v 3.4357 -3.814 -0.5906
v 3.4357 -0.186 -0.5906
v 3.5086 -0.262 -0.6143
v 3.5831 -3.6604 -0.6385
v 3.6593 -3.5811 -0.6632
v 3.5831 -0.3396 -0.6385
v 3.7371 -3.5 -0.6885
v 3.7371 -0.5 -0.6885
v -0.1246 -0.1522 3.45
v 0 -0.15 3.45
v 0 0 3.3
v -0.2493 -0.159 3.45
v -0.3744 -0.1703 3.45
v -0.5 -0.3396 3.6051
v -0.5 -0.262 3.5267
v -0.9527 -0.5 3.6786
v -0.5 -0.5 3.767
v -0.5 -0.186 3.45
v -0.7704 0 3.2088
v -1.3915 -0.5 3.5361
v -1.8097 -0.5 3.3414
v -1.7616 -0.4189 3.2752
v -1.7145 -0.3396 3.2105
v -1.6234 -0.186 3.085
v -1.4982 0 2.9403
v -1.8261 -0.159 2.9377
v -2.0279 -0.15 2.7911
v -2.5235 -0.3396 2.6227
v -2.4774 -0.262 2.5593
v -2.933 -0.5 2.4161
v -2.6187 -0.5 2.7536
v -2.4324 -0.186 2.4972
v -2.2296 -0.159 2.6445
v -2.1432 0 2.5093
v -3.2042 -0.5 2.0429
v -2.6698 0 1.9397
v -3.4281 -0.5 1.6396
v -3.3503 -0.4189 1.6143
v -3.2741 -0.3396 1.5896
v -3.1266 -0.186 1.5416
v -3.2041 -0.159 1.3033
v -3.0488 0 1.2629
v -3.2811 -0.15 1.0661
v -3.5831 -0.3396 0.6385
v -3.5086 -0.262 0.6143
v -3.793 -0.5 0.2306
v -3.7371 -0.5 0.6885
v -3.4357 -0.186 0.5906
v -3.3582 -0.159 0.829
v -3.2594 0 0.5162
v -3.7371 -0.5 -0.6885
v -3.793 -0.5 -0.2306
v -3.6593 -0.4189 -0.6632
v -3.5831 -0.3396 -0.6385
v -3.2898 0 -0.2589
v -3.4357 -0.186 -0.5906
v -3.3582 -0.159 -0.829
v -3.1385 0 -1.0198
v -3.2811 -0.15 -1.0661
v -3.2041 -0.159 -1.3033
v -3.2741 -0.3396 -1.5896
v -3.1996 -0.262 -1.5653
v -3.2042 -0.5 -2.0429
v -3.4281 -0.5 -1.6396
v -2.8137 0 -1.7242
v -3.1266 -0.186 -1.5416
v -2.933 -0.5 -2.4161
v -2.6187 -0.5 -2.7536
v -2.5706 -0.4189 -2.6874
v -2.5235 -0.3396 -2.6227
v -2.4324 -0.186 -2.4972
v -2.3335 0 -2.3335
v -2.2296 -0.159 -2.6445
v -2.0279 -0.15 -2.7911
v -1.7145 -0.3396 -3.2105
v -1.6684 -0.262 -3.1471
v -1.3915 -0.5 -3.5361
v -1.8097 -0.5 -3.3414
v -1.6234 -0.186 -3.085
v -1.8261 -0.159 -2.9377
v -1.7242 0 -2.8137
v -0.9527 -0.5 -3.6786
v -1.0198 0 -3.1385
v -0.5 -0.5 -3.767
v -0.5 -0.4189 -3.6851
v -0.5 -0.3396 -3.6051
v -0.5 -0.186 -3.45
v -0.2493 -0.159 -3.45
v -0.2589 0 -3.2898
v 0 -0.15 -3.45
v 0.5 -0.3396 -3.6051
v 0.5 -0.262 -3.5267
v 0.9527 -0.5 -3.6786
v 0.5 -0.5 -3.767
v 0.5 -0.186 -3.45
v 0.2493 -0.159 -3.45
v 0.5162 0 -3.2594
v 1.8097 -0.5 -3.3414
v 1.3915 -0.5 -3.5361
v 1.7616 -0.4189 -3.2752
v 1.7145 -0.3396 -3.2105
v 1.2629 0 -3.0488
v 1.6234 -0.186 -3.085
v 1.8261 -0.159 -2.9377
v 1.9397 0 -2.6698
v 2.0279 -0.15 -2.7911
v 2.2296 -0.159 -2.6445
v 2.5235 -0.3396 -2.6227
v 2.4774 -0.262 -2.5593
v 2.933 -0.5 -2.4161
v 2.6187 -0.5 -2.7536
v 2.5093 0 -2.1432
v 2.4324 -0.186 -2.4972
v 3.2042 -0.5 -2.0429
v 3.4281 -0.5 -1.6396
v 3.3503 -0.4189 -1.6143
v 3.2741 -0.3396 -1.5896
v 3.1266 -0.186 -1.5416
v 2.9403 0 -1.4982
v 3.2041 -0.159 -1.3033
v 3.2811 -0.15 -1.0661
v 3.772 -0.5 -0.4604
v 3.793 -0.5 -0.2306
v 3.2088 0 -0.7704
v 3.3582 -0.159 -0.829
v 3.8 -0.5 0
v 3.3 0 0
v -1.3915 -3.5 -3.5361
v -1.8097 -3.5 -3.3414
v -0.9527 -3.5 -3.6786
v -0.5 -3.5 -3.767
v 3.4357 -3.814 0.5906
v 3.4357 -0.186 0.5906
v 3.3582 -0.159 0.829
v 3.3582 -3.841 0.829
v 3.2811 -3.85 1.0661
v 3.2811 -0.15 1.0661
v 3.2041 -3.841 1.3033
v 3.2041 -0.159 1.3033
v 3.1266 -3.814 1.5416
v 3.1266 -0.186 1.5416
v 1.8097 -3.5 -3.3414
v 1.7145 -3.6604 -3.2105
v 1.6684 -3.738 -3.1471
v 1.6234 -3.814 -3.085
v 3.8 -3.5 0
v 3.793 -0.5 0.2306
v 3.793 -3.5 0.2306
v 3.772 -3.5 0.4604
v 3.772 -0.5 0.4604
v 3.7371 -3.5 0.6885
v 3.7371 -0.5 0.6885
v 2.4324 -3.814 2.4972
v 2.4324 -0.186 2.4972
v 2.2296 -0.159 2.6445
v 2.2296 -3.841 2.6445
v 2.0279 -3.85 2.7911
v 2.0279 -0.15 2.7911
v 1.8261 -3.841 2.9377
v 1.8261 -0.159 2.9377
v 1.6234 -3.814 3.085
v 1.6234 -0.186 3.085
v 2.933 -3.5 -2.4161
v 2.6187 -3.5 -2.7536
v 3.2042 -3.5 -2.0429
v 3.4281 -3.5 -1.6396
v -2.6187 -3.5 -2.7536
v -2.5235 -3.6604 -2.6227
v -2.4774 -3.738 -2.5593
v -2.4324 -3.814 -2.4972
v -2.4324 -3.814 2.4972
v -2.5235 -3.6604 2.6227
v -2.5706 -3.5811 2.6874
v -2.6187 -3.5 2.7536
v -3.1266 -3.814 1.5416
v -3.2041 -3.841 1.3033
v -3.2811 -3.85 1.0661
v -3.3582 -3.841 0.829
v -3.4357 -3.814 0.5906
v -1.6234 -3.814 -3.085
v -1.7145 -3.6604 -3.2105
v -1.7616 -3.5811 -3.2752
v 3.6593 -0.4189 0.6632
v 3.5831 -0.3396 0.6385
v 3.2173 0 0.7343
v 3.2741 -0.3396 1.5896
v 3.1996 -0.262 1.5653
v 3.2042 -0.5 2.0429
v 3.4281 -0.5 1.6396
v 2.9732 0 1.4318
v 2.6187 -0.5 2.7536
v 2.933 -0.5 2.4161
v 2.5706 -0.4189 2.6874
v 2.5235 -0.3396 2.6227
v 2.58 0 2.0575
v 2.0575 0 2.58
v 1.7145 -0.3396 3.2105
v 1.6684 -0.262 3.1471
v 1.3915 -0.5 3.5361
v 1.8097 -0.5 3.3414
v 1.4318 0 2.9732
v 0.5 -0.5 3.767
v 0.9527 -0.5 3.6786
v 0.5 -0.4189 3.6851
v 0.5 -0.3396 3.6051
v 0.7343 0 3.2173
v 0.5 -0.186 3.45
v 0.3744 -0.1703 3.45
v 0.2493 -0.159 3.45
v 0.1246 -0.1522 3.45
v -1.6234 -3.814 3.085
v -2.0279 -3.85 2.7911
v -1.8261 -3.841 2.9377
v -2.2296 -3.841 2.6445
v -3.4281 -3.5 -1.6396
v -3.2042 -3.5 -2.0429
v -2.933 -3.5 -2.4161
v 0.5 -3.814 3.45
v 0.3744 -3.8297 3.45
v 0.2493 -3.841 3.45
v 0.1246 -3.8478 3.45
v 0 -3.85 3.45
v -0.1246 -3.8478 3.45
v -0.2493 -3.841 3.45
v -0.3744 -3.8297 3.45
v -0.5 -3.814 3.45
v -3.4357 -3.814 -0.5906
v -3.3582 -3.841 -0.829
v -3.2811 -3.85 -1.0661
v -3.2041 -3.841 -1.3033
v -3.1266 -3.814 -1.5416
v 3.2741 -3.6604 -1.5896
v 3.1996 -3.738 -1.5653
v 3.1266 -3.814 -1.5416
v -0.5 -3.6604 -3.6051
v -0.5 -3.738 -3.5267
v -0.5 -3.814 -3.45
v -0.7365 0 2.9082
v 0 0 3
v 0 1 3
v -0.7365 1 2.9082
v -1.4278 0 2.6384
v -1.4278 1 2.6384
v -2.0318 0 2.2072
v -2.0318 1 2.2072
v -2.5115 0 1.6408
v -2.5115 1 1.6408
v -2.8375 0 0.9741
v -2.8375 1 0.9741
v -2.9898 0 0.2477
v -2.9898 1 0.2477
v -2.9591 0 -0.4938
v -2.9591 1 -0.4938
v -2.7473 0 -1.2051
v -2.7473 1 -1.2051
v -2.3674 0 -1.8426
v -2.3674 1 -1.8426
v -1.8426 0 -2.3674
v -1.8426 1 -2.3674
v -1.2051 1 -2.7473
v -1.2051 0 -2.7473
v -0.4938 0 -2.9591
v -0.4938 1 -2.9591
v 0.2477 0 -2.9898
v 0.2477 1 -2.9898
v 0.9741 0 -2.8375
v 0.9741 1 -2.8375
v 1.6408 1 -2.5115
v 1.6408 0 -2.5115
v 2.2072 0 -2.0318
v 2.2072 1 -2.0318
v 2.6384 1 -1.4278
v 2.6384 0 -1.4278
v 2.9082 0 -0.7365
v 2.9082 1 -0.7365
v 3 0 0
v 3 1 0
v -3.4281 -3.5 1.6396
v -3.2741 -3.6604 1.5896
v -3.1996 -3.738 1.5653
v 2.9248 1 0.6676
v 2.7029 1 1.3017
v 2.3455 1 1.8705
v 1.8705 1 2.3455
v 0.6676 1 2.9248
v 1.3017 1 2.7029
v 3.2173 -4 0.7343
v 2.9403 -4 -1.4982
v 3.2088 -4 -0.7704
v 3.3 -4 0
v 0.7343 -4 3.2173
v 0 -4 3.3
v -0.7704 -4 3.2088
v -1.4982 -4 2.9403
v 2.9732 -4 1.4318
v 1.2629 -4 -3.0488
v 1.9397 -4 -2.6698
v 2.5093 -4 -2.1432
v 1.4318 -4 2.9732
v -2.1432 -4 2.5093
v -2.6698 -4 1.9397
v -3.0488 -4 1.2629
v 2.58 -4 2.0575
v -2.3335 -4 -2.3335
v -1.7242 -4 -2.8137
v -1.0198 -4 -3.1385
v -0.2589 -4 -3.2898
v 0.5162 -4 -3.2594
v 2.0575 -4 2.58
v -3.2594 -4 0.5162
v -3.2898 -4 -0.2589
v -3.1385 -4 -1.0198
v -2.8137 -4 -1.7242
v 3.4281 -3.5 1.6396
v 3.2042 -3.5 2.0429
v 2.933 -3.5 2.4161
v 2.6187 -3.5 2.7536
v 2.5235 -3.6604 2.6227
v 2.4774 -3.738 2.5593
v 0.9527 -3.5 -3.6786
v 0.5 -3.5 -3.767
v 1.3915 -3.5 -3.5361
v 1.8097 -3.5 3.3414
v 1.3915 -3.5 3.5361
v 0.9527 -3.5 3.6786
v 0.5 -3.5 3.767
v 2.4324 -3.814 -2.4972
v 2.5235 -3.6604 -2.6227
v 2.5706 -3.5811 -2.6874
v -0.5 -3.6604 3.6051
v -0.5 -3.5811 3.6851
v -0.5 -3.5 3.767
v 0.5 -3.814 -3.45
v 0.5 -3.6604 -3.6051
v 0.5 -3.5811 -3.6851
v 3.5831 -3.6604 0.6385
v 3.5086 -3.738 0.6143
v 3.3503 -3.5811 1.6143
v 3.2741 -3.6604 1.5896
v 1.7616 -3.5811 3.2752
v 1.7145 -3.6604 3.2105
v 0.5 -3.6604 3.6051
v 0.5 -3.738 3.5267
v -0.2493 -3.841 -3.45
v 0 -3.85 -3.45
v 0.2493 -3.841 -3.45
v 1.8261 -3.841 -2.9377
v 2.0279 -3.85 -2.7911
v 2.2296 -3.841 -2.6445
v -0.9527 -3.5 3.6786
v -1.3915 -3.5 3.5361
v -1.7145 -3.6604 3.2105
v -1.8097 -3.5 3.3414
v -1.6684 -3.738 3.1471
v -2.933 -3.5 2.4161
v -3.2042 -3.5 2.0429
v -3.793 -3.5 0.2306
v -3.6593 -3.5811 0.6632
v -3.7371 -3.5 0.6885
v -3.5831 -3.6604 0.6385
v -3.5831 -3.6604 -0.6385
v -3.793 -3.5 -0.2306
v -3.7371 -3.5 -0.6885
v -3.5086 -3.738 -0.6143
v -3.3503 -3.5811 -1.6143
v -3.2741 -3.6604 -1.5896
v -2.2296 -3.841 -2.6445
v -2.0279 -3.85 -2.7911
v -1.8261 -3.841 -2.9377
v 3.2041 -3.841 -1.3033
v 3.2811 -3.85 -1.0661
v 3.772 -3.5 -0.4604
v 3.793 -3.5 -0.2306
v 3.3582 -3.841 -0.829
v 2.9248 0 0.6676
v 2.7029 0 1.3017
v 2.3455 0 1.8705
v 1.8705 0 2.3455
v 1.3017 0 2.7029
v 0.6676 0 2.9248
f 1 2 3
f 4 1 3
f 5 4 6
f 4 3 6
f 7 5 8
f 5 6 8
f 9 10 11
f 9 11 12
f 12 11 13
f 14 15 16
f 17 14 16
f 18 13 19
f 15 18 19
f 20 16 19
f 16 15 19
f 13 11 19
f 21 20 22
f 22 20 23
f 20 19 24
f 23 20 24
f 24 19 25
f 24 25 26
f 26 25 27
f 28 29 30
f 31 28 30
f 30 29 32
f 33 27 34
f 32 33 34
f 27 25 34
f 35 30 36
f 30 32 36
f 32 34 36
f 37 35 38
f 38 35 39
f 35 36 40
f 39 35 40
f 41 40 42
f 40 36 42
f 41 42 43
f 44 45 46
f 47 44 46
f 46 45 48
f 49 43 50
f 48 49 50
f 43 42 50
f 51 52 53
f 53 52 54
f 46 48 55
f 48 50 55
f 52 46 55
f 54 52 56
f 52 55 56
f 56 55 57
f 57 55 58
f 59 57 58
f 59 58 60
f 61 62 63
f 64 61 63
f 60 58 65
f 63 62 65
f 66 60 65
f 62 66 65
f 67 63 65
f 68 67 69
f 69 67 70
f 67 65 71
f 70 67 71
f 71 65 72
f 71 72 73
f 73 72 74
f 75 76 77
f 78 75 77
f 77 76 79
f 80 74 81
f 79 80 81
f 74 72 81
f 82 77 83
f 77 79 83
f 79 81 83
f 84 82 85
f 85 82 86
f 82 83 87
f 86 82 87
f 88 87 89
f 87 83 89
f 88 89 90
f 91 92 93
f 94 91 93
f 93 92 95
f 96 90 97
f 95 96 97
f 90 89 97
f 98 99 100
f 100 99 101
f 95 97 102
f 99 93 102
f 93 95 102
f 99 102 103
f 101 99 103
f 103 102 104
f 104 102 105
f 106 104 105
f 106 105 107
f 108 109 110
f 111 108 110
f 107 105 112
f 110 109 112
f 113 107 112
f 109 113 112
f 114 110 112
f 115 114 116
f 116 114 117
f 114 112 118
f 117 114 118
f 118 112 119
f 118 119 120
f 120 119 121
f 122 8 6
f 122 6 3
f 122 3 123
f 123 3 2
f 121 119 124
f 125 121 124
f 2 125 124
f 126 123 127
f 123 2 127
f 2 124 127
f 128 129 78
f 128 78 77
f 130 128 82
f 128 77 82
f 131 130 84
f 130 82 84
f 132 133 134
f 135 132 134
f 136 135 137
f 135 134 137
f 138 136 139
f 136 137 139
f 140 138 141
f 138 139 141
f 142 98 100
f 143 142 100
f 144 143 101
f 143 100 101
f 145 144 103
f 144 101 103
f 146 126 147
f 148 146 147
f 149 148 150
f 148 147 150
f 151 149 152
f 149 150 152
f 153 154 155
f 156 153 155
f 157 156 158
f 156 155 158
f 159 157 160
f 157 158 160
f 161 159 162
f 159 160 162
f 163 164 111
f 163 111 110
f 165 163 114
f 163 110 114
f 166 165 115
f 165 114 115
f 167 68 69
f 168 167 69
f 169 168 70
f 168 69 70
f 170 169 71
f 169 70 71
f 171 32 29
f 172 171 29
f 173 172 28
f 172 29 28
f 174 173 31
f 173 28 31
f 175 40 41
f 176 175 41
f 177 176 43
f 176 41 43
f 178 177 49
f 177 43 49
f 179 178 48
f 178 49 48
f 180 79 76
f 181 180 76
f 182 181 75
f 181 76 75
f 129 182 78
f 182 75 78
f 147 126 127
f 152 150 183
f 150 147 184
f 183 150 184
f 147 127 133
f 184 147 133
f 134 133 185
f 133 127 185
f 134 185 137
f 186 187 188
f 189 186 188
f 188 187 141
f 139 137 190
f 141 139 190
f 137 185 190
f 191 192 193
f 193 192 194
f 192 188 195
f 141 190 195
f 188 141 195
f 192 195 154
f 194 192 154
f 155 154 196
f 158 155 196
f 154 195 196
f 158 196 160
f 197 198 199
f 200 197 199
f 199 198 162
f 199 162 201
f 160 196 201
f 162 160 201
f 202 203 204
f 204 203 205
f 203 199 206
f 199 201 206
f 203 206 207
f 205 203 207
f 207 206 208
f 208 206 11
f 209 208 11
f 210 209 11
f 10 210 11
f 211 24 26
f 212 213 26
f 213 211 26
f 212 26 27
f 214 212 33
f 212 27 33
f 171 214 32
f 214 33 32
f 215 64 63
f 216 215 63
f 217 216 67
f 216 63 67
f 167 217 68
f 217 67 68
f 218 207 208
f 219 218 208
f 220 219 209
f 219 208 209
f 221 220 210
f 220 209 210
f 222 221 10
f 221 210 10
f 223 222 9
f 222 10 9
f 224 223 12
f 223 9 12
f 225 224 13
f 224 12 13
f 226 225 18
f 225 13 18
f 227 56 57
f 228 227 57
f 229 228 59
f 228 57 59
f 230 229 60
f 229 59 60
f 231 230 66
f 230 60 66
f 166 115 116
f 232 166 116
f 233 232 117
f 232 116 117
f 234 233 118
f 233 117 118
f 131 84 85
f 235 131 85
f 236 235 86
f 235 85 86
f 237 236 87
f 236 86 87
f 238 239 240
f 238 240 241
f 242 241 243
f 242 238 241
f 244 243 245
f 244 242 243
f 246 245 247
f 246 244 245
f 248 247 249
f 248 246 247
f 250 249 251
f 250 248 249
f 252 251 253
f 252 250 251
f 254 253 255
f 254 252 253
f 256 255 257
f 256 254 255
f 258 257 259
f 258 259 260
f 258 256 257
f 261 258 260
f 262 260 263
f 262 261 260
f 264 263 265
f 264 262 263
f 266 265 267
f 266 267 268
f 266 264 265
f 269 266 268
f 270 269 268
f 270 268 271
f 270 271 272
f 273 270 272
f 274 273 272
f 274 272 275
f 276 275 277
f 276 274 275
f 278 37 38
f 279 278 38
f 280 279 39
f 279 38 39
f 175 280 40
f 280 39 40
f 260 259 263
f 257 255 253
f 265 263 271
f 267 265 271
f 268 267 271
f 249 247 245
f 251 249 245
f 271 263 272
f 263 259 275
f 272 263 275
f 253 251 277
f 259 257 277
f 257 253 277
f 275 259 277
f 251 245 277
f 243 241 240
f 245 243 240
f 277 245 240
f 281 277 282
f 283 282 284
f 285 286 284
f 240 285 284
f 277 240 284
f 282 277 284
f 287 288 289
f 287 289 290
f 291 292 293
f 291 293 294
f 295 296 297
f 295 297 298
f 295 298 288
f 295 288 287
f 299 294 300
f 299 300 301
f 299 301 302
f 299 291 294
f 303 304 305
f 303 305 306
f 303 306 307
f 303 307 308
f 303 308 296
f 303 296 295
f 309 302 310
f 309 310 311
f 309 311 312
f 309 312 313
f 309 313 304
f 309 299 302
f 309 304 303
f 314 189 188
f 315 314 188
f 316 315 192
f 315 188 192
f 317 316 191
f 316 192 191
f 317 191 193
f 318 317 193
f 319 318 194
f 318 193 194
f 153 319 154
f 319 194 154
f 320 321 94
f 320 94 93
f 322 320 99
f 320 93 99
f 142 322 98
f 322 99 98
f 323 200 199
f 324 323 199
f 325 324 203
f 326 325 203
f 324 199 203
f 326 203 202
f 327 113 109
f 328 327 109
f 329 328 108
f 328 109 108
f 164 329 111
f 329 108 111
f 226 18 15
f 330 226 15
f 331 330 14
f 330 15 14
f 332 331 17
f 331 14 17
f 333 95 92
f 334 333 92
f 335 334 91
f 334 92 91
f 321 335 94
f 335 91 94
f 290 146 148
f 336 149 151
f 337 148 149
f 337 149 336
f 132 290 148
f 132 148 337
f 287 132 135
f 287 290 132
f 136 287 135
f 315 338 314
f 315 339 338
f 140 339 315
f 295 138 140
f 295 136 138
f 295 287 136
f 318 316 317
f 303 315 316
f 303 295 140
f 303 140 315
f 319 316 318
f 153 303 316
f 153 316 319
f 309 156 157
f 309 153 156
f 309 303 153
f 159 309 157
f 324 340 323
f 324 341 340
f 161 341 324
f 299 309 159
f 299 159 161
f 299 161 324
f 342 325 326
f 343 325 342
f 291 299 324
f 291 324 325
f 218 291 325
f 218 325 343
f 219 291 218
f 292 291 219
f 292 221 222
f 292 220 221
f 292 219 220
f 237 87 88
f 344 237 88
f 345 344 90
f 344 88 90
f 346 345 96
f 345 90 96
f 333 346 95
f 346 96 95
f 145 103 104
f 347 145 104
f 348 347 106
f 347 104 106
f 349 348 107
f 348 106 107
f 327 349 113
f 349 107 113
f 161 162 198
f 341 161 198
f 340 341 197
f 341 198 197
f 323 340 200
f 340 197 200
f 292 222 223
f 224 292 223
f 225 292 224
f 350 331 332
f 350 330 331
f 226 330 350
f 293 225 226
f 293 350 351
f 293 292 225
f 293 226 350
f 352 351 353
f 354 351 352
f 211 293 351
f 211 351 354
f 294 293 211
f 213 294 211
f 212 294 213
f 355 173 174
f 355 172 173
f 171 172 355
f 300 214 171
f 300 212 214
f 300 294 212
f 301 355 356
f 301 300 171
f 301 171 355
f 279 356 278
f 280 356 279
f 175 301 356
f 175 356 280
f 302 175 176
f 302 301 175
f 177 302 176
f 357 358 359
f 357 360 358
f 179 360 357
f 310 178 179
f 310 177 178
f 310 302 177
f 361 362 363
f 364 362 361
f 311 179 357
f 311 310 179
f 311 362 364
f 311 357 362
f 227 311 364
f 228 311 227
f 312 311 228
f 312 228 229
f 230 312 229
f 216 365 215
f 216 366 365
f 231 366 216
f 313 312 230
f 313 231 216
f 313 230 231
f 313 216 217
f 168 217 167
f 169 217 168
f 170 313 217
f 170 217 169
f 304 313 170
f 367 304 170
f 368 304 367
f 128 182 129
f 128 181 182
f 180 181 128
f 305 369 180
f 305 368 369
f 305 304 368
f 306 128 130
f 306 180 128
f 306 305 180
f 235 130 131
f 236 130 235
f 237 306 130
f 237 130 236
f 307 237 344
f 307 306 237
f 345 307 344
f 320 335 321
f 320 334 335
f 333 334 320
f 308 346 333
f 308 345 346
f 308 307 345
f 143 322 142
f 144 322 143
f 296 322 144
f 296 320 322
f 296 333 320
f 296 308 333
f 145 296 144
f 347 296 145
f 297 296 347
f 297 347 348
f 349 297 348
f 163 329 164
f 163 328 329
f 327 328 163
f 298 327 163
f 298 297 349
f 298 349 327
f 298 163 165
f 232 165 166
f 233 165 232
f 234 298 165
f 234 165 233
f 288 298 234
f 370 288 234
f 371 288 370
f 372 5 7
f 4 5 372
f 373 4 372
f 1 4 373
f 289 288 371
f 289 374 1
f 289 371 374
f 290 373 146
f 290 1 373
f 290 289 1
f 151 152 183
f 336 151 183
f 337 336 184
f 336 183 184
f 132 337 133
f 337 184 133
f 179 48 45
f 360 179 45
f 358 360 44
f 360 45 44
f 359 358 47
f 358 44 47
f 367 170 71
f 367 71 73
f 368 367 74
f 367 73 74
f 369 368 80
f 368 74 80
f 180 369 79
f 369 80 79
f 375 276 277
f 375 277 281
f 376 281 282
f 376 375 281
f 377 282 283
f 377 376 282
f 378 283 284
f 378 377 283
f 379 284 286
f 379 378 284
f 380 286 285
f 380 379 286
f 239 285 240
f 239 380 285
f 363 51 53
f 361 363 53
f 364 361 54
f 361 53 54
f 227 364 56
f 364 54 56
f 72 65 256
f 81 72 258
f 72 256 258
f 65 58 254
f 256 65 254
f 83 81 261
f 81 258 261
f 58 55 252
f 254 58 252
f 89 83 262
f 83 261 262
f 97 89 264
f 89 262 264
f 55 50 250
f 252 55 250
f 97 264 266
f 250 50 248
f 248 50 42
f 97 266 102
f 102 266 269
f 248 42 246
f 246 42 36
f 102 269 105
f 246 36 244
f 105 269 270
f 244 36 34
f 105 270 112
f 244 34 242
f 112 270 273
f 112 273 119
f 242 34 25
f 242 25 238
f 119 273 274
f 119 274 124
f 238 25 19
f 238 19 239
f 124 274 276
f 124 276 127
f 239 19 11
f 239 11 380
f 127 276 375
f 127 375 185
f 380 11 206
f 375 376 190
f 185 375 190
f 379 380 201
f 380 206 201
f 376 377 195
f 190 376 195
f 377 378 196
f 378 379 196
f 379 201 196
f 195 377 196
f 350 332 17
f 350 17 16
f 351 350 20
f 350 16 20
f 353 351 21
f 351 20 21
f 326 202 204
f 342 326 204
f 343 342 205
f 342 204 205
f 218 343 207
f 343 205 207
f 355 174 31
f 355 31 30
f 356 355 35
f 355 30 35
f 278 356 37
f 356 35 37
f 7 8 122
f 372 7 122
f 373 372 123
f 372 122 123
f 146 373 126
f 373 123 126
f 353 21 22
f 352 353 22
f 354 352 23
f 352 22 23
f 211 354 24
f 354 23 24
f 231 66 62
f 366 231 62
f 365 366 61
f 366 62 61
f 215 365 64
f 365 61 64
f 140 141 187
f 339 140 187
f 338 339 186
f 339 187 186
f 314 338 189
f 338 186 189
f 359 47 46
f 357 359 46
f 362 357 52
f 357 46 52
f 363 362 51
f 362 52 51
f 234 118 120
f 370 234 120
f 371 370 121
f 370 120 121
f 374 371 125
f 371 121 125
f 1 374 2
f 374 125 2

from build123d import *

# Parameters (mm, degrees)
F1_DEPTH = 1
F2_DEPTH = 4
F3_SIZE  = 0.5
F5_DEPTH = 10


# Not quite as in the source:
# - a feature names something its author has since deleted; it is built from what else it names


with BuildPart() as f1:
    # F0 (on Front) → F1 (new body)
    with BuildSketch(Plane.XZ):
        with BuildLine():
            ThreePointArc((3, 0), (2.1213203436, 2.1213203436), (0, 3))
            ThreePointArc((0, 3), (-2.1213203436, -2.1213203436), (3, 0))
        make_face()
    extrude(amount=-F1_DEPTH)

    # F0 (on Front) → F2 (join)
    with BuildSketch(Plane.XZ):
        with BuildLine():
            ThreePointArc((0, 3.8), (-2.6870057685, -2.6870057685), (3.8, 0))
            ThreePointArc((3.8, 0), (2.6870057685, 2.6870057685), (0, 3.8))
        make_face()
        with BuildLine():
            ThreePointArc((3, 0), (-2.1213203436, -2.1213203436), (0, 3))
            ThreePointArc((0, 3), (2.1213203436, 2.1213203436), (3, 0))
        make_face(mode=Mode.SUBTRACT)
        with BuildLine():
            ThreePointArc((3, 0), (2.1213203436, 2.1213203436), (0, 3))
            ThreePointArc((0, 3), (-2.1213203436, -2.1213203436), (3, 0))
        make_face()
    extrude(amount=F2_DEPTH)

    # F3
    f3_edges = [f1.edges().sort_by_distance(p)[0] for p in [
        (0, -4, -3.8),
        (0, 0, -3.8),
    ]]
    chamfer(f3_edges, length=F3_SIZE)

    # F4 (on face) → F5 (cut)
    with BuildSketch(Plane(origin=(0, 1, 0), x_dir=(-1, 0, 0), z_dir=(0, 1, 0))):
        with BuildLine():
            Line((-1.6233506232, 3.0850012567), (-1.809656001, 3.3414286104))
            ThreePointArc((-1.809656001, 3.3414286104), (-2.2335839587, 3.0742645786), (-2.6186729953, 2.7536433581))
            Line((-2.6186729953, 2.7536433581), (-2.4323676176, 2.4972160044))
            Line((-2.4323676176, 2.4972160044), (-1.6233506232, 3.0850012567))
        make_face()
        with BuildLine():
            Line((0, 3.45), (0, 3.8))
            ThreePointArc((0, 3.8), (-0.2505451722, 3.7917314141), (-0.5, 3.7669616404))
            Line((-0.5, 3.7669616404), (-0.5, 3.45))
            Line((-0.5, 3.45), (0, 3.45))
        make_face()
        with BuildLine():
            Line((0.5, 3.45), (0.5, 3.7669616404))
            ThreePointArc((0.5, 3.7669616404), (0.2505451722, 3.7917314141), (0, 3.8))
            Line((0, 3.8), (0, 3.45))
            Line((0, 3.45), (0.5, 3.45))
        make_face()
        with BuildLine():
            ThreePointArc((3.4280849175, -1.6395834222), (3.6140147619, -1.1742645786), (3.7371019119, -0.6885269059))
            Line((3.7371019119, -0.6885269059), (3.4356534784, -0.5905803724))
            Line((3.4356534784, -0.5905803724), (3.126636484, -1.5416368887))
            Line((3.126636484, -1.5416368887), (3.4280849175, -1.6395834222))
        make_face()
        with BuildLine():
            ThreePointArc((1.809656001, -3.3414286104), (2.2335839587, -3.0742645786), (2.6186729953, -2.7536433581))
            Line((2.6186729953, -2.7536433581), (2.4323676176, -2.4972160044))
            Line((2.4323676176, -2.4972160044), (1.6233506232, -3.0850012567))
            Line((1.6233506232, -3.0850012567), (1.809656001, -3.3414286104))
        make_face()
        with BuildLine():
            ThreePointArc((-0.5, -3.7669616404), (0, -3.8), (0.5, -3.7669616404))
            Line((0.5, -3.7669616404), (0.5, -3.45))
            Line((0.5, -3.45), (-0.5, -3.45))
            Line((-0.5, -3.45), (-0.5, -3.7669616404))
        make_face()
        with BuildLine():
            ThreePointArc((-2.6186729953, -2.7536433581), (-2.2335839587, -3.0742645786), (-1.809656001, -3.3414286104))
            Line((-1.809656001, -3.3414286104), (-1.6233506232, -3.0850012567))
            Line((-1.6233506232, -3.0850012567), (-2.4323676176, -2.4972160044))
            Line((-2.4323676176, -2.4972160044), (-2.6186729953, -2.7536433581))
        make_face()
        with BuildLine():
            ThreePointArc((-3.7371019119, -0.6885269059), (-3.6140147619, -1.1742645786), (-3.4280849175, -1.6395834222))
            Line((-3.4280849175, -1.6395834222), (-3.126636484, -1.5416368887))
            Line((-3.126636484, -1.5416368887), (-3.4356534784, -0.5905803724))
            Line((-3.4356534784, -0.5905803724), (-3.7371019119, -0.6885269059))
        make_face()
        with BuildLine():
            Line((-3.126636484, 1.5416368887), (-3.4280849175, 1.6395834222))
            ThreePointArc((-3.4280849175, 1.6395834222), (-3.6140147619, 1.1742645786), (-3.7371019119, 0.6885269059))
            Line((-3.7371019119, 0.6885269059), (-3.4356534784, 0.5905803724))
            Line((-3.4356534784, 0.5905803724), (-3.126636484, 1.5416368887))
        make_face()
        with BuildLine():
            Line((3.4356534784, 0.5905803724), (3.7371019119, 0.6885269059))
            ThreePointArc((3.7371019119, 0.6885269059), (3.6140147619, 1.1742645786), (3.4280849175, 1.6395834222))
            Line((3.4280849175, 1.6395834222), (3.126636484, 1.5416368887))
            Line((3.126636484, 1.5416368887), (3.4356534784, 0.5905803724))
        make_face()
        with BuildLine():
            Line((2.4323676176, 2.4972160044), (2.6186729953, 2.7536433581))
            ThreePointArc((2.6186729953, 2.7536433581), (2.2335839587, 3.0742645786), (1.809656001, 3.3414286104))
            Line((1.809656001, 3.3414286104), (1.6233506232, 3.0850012567))
            Line((1.6233506232, 3.0850012567), (2.4323676176, 2.4972160044))
        make_face()
    extrude(amount=-F5_DEPTH, mode=Mode.SUBTRACT)


solid = f1.part
